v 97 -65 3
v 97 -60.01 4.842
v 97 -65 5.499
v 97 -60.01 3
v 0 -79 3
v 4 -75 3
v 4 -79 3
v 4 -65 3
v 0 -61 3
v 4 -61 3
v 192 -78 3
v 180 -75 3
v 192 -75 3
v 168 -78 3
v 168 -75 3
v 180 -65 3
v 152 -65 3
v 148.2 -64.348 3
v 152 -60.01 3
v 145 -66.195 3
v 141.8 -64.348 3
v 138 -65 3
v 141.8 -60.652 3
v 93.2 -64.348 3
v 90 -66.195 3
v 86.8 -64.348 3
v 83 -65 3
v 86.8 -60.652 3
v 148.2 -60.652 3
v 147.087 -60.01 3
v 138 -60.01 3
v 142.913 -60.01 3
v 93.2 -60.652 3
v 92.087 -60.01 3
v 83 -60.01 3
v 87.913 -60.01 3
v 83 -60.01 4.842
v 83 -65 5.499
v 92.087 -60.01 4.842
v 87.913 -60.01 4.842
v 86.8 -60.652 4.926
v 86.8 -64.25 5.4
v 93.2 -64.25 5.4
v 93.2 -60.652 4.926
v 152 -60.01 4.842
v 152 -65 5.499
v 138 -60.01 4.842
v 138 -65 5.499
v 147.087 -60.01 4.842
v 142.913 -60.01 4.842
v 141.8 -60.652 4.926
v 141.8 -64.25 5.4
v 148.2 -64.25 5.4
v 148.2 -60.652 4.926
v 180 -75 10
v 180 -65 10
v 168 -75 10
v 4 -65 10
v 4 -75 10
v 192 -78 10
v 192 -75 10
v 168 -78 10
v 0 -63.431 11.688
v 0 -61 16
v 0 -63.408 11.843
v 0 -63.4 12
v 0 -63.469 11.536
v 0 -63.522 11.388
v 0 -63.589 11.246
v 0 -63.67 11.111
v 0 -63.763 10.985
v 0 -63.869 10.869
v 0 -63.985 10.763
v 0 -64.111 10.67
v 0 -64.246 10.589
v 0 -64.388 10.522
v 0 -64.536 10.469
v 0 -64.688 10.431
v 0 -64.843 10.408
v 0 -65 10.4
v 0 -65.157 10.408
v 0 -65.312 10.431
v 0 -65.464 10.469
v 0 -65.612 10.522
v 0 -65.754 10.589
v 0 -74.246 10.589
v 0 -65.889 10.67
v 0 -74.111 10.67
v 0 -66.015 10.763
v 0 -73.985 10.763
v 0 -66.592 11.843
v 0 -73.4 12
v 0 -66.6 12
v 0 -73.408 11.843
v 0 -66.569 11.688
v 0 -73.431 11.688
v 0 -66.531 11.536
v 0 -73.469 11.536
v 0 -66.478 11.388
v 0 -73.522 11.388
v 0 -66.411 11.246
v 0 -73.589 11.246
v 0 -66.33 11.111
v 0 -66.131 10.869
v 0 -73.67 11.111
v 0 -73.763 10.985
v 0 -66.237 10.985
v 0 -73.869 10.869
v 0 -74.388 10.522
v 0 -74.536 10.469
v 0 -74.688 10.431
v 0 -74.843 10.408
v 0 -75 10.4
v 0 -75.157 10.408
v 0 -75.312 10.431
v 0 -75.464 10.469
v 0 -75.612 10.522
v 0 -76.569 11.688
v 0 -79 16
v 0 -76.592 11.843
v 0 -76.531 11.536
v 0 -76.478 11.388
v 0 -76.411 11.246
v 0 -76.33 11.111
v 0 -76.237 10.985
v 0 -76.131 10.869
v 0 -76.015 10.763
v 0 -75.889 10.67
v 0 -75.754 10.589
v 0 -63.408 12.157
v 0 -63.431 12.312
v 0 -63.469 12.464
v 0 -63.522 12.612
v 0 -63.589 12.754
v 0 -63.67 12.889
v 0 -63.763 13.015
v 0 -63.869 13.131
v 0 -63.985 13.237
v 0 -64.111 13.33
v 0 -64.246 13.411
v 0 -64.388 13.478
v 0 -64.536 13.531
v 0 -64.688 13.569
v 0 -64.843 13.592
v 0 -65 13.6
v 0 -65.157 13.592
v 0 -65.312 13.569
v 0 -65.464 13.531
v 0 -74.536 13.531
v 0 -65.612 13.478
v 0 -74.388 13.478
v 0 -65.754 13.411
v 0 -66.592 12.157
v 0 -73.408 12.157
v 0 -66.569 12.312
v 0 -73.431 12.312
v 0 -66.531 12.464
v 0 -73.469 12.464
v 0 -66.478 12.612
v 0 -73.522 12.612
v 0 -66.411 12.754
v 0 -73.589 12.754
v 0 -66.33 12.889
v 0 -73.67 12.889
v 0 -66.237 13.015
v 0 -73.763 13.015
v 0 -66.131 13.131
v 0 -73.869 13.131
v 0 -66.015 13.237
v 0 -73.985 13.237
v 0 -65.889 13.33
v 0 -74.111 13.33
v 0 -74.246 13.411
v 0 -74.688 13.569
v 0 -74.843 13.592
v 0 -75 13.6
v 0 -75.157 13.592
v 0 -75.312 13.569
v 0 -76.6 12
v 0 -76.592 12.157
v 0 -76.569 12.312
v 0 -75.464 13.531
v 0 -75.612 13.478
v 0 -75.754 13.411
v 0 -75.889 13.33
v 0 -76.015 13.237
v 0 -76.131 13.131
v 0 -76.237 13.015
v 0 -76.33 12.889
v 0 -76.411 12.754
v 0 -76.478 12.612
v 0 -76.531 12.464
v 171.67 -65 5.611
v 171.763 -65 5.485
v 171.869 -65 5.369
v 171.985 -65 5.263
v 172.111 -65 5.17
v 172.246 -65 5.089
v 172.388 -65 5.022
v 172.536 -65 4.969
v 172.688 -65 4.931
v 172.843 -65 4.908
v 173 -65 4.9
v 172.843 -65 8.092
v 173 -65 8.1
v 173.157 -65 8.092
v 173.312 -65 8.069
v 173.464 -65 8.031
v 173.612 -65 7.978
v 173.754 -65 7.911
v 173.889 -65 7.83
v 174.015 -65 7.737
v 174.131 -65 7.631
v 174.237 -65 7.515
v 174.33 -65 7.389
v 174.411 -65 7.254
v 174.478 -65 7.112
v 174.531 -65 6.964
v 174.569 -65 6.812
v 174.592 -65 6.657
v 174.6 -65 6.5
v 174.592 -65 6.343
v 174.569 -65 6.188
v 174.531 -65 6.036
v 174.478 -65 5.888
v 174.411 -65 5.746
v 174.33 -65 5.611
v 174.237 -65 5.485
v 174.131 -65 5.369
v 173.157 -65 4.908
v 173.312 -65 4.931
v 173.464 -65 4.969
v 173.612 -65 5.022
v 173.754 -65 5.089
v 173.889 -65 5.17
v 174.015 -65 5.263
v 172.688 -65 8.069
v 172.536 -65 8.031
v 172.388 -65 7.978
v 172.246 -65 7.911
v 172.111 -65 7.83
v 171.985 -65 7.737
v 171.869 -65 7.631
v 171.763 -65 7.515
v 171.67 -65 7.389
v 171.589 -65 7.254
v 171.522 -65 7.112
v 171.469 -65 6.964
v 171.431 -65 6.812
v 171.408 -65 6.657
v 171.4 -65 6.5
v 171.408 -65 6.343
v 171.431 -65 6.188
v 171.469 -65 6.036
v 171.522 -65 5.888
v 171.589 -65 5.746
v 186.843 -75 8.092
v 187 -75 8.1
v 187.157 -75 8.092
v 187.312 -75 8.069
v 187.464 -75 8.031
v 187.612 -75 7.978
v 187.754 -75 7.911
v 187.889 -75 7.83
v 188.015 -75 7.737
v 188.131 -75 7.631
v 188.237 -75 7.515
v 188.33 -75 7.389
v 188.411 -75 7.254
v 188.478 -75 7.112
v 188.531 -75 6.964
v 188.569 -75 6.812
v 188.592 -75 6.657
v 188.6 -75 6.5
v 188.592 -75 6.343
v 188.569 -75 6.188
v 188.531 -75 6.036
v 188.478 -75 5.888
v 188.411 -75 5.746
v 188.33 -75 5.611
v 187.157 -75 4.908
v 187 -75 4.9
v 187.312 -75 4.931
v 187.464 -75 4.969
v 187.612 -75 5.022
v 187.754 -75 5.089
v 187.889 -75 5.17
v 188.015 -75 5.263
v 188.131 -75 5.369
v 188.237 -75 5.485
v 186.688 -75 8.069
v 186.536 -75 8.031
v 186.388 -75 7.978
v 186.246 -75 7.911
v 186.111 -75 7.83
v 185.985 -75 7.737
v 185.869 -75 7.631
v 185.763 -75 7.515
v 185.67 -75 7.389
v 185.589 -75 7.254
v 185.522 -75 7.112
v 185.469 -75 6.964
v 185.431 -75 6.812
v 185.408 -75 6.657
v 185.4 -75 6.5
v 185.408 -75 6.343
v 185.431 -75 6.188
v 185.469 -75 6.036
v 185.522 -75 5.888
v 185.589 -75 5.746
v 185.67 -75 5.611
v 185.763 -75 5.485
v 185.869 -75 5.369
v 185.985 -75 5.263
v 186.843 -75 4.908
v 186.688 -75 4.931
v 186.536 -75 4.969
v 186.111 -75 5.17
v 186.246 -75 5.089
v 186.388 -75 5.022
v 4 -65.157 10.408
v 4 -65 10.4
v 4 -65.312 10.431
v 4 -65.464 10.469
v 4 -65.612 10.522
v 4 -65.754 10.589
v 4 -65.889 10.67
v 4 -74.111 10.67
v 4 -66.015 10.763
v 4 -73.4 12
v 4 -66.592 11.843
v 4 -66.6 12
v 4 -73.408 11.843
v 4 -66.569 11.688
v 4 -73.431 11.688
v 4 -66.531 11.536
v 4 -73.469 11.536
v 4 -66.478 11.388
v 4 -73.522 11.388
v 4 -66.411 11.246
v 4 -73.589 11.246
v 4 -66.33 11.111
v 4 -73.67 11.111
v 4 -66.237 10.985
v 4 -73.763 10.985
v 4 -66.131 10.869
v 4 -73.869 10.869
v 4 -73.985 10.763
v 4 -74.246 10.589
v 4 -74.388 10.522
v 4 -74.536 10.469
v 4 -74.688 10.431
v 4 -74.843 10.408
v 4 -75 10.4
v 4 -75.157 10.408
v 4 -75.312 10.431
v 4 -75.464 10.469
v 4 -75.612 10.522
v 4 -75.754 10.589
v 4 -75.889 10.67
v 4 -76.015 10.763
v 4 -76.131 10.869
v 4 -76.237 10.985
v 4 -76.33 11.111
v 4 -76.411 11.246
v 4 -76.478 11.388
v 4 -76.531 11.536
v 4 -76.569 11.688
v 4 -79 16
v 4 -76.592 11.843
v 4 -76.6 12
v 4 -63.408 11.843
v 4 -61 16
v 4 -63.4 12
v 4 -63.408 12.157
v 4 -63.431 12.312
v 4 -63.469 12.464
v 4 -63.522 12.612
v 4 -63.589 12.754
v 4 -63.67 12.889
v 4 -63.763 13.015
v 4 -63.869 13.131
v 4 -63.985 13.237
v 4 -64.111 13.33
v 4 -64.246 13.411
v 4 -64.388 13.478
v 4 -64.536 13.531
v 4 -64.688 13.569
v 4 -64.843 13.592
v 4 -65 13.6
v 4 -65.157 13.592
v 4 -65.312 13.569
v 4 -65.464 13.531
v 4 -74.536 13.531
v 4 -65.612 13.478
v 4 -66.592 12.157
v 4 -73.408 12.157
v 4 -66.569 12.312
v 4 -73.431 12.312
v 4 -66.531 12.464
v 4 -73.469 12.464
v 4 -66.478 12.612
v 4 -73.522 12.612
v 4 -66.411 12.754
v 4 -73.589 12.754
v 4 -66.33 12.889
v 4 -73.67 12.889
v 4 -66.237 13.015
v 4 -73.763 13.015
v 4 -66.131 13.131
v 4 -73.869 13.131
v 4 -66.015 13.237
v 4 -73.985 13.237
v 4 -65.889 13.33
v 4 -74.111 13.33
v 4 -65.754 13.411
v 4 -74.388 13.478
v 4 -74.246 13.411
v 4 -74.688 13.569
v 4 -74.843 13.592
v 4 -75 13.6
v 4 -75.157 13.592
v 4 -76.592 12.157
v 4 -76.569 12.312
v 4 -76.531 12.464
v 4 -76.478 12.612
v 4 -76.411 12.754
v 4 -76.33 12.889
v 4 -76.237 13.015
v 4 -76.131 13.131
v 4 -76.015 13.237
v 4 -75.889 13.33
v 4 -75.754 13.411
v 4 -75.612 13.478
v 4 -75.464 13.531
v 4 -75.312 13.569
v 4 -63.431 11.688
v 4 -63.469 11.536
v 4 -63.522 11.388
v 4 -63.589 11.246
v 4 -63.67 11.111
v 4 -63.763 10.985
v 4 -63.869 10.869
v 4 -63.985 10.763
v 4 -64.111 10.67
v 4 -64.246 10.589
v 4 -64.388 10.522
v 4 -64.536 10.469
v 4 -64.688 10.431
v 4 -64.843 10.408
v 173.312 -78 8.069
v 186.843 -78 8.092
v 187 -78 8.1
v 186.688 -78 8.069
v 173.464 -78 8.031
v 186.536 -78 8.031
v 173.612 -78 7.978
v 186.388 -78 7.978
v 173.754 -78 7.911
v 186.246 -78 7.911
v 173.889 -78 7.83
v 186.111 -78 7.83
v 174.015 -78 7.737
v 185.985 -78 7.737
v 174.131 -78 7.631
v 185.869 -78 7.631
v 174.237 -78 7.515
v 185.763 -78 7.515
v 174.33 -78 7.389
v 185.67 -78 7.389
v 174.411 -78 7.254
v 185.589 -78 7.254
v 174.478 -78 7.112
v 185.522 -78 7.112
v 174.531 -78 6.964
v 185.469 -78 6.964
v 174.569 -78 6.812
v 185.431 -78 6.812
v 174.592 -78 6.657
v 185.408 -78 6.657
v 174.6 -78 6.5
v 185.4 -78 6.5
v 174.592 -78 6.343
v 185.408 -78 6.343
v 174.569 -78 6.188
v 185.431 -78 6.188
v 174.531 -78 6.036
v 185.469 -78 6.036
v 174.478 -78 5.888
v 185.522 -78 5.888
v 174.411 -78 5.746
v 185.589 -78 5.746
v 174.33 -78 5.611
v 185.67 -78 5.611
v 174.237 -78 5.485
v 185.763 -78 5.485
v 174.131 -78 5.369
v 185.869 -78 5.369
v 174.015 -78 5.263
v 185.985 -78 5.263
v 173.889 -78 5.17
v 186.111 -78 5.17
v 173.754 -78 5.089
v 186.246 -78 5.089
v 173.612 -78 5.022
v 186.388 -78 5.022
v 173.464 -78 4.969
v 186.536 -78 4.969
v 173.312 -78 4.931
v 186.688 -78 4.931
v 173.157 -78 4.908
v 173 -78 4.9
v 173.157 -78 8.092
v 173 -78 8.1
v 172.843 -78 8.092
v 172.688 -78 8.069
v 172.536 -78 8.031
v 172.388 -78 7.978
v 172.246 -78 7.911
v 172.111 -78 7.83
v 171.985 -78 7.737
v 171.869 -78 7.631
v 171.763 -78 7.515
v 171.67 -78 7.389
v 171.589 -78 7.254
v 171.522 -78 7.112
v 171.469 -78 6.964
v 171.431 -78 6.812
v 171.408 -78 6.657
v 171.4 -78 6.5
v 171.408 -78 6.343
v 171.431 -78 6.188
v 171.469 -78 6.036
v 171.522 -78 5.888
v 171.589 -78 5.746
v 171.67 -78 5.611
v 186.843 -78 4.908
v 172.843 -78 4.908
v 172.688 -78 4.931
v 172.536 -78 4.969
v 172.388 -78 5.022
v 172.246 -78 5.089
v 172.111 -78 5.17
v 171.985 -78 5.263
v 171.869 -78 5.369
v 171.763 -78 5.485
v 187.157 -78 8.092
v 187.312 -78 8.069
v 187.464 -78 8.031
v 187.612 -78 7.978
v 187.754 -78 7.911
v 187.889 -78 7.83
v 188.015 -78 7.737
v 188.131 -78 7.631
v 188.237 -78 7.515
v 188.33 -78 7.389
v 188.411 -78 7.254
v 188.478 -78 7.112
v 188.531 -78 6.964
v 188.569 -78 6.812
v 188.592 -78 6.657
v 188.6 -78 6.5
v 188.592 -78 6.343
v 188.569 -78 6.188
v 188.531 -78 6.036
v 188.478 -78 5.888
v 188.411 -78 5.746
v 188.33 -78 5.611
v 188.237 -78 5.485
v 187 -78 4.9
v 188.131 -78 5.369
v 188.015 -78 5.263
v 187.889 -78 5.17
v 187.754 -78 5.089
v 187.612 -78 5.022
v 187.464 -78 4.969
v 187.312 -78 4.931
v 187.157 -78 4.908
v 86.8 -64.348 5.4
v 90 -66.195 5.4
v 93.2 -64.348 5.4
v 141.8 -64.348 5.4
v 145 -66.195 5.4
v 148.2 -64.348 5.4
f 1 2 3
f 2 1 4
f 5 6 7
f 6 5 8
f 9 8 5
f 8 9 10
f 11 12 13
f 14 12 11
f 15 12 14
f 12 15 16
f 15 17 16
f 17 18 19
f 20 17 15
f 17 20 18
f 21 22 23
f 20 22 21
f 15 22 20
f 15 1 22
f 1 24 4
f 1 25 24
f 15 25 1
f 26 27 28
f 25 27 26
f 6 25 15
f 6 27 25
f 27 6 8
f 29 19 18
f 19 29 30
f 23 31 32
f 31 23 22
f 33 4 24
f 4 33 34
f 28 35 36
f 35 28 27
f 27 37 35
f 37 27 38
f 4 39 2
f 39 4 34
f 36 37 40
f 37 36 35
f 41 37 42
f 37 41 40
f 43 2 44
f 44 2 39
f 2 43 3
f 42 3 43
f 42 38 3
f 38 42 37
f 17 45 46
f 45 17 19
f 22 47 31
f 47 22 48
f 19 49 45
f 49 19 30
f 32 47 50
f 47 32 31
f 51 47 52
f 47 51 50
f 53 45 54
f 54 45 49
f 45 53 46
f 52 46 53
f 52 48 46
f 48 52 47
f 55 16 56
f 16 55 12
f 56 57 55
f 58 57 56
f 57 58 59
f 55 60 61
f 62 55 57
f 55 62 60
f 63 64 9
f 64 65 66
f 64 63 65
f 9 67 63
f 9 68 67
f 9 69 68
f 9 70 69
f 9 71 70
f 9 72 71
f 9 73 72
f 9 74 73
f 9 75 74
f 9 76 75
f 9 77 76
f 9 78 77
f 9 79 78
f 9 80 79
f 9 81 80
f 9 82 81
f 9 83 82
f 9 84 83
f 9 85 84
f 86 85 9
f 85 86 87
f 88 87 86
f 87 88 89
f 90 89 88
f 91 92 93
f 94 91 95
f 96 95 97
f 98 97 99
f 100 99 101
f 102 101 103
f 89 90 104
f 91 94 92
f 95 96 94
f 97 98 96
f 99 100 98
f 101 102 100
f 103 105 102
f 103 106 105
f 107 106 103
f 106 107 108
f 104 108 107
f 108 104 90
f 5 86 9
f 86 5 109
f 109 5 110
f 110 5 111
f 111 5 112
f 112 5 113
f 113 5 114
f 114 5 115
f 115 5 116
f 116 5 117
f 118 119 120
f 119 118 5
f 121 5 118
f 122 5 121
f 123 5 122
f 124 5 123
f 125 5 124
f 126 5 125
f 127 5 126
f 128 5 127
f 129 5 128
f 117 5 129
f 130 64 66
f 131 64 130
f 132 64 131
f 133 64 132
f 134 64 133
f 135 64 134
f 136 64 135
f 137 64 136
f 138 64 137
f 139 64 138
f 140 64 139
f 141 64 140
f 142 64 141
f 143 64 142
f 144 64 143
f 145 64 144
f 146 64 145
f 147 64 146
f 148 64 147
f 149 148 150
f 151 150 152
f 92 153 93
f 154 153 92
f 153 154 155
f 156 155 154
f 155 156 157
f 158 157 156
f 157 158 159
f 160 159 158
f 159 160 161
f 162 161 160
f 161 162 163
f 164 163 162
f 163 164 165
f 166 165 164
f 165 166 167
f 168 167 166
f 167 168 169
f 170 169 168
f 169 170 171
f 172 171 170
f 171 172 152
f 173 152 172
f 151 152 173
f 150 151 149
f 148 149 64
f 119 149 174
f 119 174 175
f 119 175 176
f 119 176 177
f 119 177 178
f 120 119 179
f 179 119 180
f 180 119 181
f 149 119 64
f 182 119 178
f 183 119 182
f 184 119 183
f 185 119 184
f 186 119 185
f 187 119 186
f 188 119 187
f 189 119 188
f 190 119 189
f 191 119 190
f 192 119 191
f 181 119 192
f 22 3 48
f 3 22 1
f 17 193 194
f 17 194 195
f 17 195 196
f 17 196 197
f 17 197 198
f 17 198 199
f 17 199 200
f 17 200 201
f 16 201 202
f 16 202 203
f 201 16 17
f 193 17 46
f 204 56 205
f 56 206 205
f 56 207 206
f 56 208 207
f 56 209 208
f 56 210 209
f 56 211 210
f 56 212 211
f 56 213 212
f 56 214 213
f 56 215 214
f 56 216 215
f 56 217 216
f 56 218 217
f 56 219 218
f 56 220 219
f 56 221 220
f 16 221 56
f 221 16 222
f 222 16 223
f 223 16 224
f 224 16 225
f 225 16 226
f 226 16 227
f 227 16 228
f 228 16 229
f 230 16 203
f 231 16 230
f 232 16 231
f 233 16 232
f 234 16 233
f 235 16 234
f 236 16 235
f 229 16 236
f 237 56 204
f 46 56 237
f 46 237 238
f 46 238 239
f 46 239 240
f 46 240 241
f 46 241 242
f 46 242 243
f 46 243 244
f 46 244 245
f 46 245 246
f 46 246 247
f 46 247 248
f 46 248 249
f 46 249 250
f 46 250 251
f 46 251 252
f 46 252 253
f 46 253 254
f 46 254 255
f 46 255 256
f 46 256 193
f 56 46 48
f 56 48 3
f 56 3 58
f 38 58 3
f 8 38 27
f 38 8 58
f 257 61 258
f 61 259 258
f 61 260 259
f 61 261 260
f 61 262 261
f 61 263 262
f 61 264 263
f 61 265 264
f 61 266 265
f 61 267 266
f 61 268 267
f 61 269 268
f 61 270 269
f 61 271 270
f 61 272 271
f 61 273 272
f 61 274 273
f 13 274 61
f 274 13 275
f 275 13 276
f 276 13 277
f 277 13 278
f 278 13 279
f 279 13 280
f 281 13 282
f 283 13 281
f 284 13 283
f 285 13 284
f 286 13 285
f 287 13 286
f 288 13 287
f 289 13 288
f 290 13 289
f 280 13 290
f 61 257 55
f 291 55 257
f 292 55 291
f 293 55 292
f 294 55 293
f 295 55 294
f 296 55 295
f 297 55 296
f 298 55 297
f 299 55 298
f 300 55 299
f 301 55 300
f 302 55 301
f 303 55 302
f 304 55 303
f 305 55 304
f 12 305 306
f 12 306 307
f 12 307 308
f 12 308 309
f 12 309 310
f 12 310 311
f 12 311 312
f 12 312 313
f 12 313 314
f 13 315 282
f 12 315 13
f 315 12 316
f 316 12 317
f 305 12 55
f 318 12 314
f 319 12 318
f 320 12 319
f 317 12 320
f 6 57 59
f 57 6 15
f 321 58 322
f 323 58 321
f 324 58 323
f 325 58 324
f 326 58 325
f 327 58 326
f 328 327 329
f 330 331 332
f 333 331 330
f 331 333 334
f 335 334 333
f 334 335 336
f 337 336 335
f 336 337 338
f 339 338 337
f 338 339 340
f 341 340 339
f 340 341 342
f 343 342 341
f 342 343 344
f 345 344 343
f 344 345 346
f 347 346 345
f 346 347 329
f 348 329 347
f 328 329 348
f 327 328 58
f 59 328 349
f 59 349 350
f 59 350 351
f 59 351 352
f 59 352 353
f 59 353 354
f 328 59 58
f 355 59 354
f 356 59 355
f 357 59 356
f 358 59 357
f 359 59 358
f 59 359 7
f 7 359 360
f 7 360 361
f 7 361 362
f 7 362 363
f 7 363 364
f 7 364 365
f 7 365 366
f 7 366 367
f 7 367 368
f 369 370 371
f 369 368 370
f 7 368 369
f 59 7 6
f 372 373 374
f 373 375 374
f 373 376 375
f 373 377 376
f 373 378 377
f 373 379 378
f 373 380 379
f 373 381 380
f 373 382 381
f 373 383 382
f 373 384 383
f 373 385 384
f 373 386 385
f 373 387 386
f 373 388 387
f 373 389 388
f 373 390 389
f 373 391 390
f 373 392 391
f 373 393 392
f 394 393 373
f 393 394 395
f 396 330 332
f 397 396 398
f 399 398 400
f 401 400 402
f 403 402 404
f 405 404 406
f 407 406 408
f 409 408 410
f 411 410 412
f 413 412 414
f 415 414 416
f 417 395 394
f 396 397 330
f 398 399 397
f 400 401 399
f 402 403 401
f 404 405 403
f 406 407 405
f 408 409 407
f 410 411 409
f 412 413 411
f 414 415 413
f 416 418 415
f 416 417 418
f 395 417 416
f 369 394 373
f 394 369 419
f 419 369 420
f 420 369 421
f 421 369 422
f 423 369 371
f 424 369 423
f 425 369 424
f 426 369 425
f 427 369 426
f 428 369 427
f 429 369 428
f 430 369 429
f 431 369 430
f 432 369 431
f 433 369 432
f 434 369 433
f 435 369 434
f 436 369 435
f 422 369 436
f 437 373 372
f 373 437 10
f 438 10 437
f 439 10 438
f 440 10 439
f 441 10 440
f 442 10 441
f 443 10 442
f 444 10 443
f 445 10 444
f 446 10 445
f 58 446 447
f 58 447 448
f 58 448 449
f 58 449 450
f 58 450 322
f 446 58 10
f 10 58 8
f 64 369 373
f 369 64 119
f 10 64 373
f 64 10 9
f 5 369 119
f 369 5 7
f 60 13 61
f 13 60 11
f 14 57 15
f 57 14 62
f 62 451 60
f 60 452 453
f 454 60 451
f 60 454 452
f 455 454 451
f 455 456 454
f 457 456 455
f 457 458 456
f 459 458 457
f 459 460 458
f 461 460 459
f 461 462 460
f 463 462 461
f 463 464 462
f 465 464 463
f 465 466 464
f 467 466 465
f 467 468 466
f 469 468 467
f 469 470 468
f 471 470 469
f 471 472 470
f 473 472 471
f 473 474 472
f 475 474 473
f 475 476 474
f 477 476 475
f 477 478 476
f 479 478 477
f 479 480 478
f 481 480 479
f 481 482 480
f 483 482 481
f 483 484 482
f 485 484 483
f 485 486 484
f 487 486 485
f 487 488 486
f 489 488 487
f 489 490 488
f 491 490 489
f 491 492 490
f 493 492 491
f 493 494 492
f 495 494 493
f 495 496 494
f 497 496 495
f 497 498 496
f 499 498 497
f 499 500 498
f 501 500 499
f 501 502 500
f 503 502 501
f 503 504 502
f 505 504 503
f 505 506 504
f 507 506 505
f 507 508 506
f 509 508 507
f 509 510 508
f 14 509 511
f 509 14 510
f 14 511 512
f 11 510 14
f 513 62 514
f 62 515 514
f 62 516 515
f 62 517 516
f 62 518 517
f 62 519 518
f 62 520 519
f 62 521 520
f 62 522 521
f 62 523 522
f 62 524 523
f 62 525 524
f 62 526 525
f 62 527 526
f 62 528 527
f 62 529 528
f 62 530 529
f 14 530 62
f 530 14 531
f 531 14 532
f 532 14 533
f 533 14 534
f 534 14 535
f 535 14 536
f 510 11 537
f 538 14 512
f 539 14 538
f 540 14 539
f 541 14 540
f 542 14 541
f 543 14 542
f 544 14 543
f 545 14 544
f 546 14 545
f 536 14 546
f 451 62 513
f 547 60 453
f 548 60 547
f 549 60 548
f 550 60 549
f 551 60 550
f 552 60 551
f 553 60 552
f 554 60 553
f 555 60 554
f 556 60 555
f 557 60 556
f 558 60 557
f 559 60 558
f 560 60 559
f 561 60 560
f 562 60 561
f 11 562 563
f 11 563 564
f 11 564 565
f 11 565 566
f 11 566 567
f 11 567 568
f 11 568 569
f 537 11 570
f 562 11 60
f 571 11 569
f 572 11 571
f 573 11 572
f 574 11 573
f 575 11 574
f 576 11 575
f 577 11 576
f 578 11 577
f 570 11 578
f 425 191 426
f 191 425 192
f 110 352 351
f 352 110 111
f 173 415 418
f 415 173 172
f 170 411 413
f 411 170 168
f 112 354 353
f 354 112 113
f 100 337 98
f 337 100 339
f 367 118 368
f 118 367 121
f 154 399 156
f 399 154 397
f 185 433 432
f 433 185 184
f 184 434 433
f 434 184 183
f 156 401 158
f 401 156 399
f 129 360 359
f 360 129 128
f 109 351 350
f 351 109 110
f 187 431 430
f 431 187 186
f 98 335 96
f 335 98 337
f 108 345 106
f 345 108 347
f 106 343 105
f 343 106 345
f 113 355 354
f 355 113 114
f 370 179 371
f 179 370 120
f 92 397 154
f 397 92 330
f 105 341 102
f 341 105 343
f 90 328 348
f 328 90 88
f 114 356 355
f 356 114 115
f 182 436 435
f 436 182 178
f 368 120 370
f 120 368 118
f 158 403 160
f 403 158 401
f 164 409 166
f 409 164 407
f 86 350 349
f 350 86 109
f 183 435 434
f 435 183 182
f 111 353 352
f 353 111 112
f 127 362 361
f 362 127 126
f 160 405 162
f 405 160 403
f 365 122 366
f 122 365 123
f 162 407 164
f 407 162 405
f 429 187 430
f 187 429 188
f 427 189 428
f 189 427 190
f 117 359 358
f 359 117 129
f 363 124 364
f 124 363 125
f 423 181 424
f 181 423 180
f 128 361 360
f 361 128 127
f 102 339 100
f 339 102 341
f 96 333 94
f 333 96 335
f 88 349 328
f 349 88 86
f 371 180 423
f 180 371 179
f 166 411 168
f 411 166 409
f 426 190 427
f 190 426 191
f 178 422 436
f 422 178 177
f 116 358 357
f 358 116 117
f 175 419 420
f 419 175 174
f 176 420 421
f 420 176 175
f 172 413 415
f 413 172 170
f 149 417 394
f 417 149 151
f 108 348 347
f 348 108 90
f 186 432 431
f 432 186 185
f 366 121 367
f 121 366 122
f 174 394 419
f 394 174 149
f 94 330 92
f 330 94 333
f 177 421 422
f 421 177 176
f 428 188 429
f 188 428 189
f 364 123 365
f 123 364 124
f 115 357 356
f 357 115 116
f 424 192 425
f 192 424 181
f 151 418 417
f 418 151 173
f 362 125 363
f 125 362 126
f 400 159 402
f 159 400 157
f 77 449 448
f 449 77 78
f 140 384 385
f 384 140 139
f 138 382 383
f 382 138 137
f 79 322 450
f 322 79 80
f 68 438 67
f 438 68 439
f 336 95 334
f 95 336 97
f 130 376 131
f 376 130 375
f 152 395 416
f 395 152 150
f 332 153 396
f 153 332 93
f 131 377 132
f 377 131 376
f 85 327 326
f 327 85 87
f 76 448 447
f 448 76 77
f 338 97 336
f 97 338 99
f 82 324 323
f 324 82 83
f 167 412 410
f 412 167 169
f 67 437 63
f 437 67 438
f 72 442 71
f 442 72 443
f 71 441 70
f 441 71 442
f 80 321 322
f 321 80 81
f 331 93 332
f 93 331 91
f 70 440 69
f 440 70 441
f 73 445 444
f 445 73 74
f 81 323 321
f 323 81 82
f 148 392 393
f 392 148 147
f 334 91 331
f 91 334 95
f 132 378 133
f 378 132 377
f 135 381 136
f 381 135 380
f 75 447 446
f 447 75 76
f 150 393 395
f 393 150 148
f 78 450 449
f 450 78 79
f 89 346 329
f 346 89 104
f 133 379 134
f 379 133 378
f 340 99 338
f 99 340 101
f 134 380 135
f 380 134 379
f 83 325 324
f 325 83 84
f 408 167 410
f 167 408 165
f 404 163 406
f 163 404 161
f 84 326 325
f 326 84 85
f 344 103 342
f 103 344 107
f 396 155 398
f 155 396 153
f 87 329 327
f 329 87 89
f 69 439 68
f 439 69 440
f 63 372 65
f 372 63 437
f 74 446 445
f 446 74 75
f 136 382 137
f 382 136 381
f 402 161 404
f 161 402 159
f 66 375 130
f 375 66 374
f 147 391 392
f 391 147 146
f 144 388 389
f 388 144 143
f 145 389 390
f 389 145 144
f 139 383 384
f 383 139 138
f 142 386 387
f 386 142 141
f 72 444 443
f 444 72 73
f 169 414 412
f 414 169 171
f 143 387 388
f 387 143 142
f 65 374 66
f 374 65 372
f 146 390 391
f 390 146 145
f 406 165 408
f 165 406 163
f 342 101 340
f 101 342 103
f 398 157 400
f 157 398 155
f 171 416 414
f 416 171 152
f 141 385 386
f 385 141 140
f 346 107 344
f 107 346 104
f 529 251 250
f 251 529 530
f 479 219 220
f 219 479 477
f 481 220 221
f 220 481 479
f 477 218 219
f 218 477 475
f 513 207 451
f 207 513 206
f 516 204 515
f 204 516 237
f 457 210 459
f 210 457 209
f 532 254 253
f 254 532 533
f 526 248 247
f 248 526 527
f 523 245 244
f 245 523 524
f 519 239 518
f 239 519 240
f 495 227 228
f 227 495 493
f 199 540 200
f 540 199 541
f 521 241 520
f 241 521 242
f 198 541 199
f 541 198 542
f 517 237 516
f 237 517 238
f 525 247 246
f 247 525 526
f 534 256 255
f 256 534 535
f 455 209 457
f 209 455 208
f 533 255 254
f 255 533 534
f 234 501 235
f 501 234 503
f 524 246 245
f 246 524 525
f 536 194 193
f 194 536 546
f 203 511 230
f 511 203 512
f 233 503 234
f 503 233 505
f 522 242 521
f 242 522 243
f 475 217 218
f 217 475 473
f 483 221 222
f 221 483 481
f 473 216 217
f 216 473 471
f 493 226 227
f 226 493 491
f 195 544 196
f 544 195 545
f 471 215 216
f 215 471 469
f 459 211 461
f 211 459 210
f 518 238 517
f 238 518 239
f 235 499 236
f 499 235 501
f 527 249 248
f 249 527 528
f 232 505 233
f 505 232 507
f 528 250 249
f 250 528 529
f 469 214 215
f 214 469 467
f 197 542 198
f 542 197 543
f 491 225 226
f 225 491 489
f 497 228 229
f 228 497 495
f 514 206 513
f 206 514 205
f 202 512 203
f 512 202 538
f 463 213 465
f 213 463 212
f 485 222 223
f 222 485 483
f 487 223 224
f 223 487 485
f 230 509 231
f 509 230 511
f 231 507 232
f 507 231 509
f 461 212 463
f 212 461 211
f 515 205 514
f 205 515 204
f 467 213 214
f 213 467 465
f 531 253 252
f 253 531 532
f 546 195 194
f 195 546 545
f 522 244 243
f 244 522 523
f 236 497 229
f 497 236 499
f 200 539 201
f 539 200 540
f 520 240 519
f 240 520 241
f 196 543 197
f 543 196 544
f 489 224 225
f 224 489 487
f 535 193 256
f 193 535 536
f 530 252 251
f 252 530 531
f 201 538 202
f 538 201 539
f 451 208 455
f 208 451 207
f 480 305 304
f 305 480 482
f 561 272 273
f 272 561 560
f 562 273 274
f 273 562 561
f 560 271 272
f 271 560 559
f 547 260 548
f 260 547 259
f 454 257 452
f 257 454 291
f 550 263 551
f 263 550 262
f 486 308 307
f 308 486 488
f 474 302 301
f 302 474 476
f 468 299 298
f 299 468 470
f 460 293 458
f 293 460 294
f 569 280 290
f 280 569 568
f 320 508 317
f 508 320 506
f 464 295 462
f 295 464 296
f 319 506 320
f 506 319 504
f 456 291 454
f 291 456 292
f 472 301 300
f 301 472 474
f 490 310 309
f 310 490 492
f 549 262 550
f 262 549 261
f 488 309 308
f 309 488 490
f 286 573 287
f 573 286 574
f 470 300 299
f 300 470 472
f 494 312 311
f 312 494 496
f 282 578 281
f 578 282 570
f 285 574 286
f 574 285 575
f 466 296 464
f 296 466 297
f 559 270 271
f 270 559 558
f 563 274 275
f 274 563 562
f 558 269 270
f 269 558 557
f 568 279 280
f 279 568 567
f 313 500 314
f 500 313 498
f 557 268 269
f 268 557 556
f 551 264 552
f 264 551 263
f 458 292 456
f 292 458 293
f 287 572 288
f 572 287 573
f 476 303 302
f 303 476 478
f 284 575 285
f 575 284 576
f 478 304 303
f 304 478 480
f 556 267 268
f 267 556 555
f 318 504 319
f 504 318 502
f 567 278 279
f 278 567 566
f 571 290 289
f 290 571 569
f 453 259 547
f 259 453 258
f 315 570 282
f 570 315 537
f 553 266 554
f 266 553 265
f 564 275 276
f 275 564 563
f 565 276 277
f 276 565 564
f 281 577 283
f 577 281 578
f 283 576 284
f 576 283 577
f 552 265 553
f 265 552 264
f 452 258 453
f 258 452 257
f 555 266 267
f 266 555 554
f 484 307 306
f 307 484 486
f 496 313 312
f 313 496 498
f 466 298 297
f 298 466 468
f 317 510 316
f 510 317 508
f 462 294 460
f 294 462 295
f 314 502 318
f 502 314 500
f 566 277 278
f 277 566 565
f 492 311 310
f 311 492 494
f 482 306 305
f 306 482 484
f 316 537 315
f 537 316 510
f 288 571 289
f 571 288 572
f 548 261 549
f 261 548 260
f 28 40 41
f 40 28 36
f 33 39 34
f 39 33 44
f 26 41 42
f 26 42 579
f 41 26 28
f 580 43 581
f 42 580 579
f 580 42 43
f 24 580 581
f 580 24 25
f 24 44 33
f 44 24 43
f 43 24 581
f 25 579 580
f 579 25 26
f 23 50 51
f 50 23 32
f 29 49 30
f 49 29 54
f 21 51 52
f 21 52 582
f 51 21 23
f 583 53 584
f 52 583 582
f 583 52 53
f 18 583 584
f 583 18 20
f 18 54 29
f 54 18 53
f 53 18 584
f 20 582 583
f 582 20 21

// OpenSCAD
// file: ../fj.scad
// FreeJet FJ-2 - shared dimensions and helpers.
// Coordinates (mm): X = carriage travel (left -> right, 0 = inner face of the left plate)
//                   Y = paper travel (paper moves toward +Y, 0 = black nozzle line)
//                   Z = up (0 = paper surface on the platen)
// Every part file includes this, so changing a number here moves everything.

$fn = 64;
e = 0.01;
tol = 0.25;          // clearance for printed fits

// ---- which cartridges? (HP 63 / 302 / 123 / 803 family) ---------------------------
// "K" = black only, "CMY" = tri-colour only, "KCMY" = black + tri-colour side by side.
CARTS     = "K";
N_SLOTS   = CARTS == "KCMY" ? 2 : 1;
head_pitch = 28;                      // black-to-colour cartridge spacing in the carriage
head_span = (N_SLOTS - 1) * head_pitch;
function slot_ink(i) = CARTS == "CMY" ? "C" : (i == 0 ? "K" : "C");

// ---- frame ----------------------------------------------------------------
inner_w   = 360 + 2 * head_span;     // distance between the side plates
plate_t   = 8;
rod_d     = 8;
// rods reach through both plates plus a printed collar each side; rounded up to a length
// you can buy (400 mm for one cartridge, 500 mm for black + colour, or cut them)
rod_len   = ceil((inner_w + 2 * 8 + 2 * 8 + 8) / 100) * 100;
plate_y0  = -128;    // side plate outline in Y (includes the roll-holder ear)
plate_y1  = 84;
plate_z0  = -70;     // bottom of the feet
plate_z1  = 70;

// ---- carriage rods ------------------------------------------------------------
rail_y    = -42;
rail_lo_z = 14;
rail_hi_z = 50;
belt_y    = -60;     // axis line of the X motor pulley and idler (both vertical)
belt_z    = 32;      // height of the belt centre
belt_r    = 20*2/PI/2;          // 20T GT2 pitch radius
belt_front_y = belt_y + belt_r; // strand clamped to the carriage
belt_back_y  = belt_y - belt_r; // return strand, passes behind the carriage

// ---- paper path: ONE feed roller just behind the printhead ----------------------------
tire_od   = 22;      // feed roller outside diameter (TPU tires on printed hubs)
feed_y    = -25;     // feed roller axis: as close behind the nozzles as the carriage allows
shaft_z   = -tire_od/2;
// spring-steel leaves press the paper onto the roller (no pinch shaft). They hang from a light
// printed bar spanning the frame above the paper entry; the paper slides in under the bar.
leaf_bar_y = -70;    // bar centre line
leaf_bar_z = 3;      // underside of the bar (paper passes below)
leaf_y1   = -21;     // leaf tip, just past the top of the roller
leaf_w    = 10;      // 0.3 mm spring steel (feeler-gauge strip), cut 52 mm long
leaf_angle = 7.5;    // ledge tilt: the free leaf would end ~2 mm below the paper -> ~0.4 N
tray_y1   = -74;     // front edge of the paper tray
// platen = a printed beam of bolted segments that also braces the frame
web_y     = [-50, -8, 22, 74];   // stiffening webs under the platen (run along X)
web_t     = 4;
web_z0    = -18;                  // bottom of the webs
flange_y  = [-50, 74];            // the two outer webs bolt to the side plates
flange_z  = [-9, -16];            // M3 bolt heights in the plates (vertical slots in the flanges)
platen_y0 = -62;     // platen top surface extent (entry ramp -> tear-off edge)
platen_y1 = 84;
sensor_y  = -42;     // paper lever switch, just before the roller nip
paper_x0  = 70 + head_span;   // paper left edge (fixed guide)
paper_w   = 220;     // widest sheet
sensor_x  = paper_x0 + 14;   // paper lever switch X
tire_x    = [paper_x0+20, paper_x0+75, paper_x0+145, paper_x0+200];  // roller positions

// ---- feed drive: 20T on the motor -> 60T printed pulley on the roller, 200 mm GT2 loop ----
pulley_teeth = 60;
feed_ctr  = 58.6;                     // centre distance for a 200 mm loop with 20T/60T
feed_dir  = [-0.79, -0.62];           // motor sits below and behind the roller
feed_motor_y = feed_y + feed_ctr * feed_dir[0];
feed_motor_z = shaft_z + feed_ctr * feed_dir[1];

// ---- roll holder: keyhole slots in the side plates -------------------------------------
roll_y    = -116;    // spindle axis
roll_z    = 62;
spindle_d = 12;

// ---- cartridges (MEASURE YOURS AND ADJUST) ------------------------------------------------
cart_w    = 21;      // across the carriage travel (X)
cart_d    = 37;      // front-to-back (Y)
cart_h    = 47;
nz_back   = 12;      // nozzle line distance from the contact (back) face
head_gap  = 1.2;     // nozzle plate height above the paper
flex_w    = 22;  flex_h = 26;   // area for the contact flex (salvaged from an HP DeskJet carriage)
carr_w    = 54 + head_span;     // carriage width along X
park_x    = 33;      // black (slot 0) nozzles X when parked (capped); carriage left face at 6
function slot_x(i) = (i - (N_SLOTS - 1) / 2) * head_pitch;   // slot i vs carriage centre

// ---- service station ------------------------------------------------------------
home_x    = 30;      // slot-0 nozzle X where the home switch trips (firmware X = 0)
sled_engage = 9;     // sled travel when parked (cap pressed on the nozzles)
cap_x     = park_x + sled_engage;   // slot-0 cap centre with the sled retracted (caps at head_pitch)
wiper_x   = 56 + head_span;
spit_x    = 62 + head_span;      // firmware spit_x_um = (spit_x - home_x) * 1000

// ---- hardware -----------------------------------------------------------------
lm8uu_d = 15; lm8uu_l = 24;
b608_d = 22; b608_w = 7;
m3 = 3.2; m3_head = 6; m3_nut = 6.4;   // across flats + tolerance
m25 = 2.7;
nema_hole = 31; nema_body = 42.3; nema_boss = 22.5;

// ---- derived layout ------------------------------------------------------------------
// segment boundaries: segment 0 carries the service-station end, the rest share the width
platen_seg0_end = paper_x0 + 88 <= 160 ? paper_x0 + 88 : paper_x0 - 10;   // keep joints off the sensor
platen_rest = ceil((inner_w - platen_seg0_end) / 130);
platen_segs = 1 + platen_rest;
function platen_seg_x(s) = s == 0 ? [0, platen_seg0_end] :
    let(w = (inner_w - platen_seg0_end) / platen_rest)
    [platen_seg0_end + (s - 1) * w, s == platen_segs - 1 ? inner_w : platen_seg0_end + s * w];
// electronics tray position (bolts through the platen webs)
etray_x0  = paper_x0 + 80 + (N_SLOTS > 1 ? 15 : 0);   // keep its bolts off the platen joints
etray_bolts = [etray_x0 + 25, etray_x0 + 95];

module rod_hole(l=40, d=rod_d+tol) { cylinder(d=d, h=l, center=true); }
module m3_hole(l=40) { cylinder(d=m3, h=l, center=true); }
module m3_nut_trap(h=3) { cylinder(d=m3_nut/cos(30), h=h, $fn=6); }
module rounded_box(size, r=3) {
    hull() for (x=[r, size[0]-r], y=[r, size[1]-r]) translate([x, y, 0]) cylinder(r=r, h=size[2]);
}
module nema17_holes(l=20, slot=0) {
    for (x=[-1,1], y=[-1,1]) hull() for (s=[-slot/2, slot/2])
        translate([x*nema_hole/2, y*nema_hole/2 + s, 0]) cylinder(d=m3, h=l, center=true);
    hull() for (s=[-slot/2, slot/2]) translate([0, s, 0]) cylinder(d=nema_boss+1, h=l, center=true);
}

// ---- printed shaft collars --------------------------------------------------------
collar_od = 20; collar_w = 8;

// ---- carriage details ------------------------------------------------------------
carr_z0   = head_gap + 2.5;   // carriage walls stop above the nozzle plate
carr_z1   = 60;
cart_rest_z = 14;              // height (above cartridge bottom) of the side rest tabs; 0 = none
// main file
// Leaf-spring bar: spans the frame just above the paper entry and holds four spring-steel
// leaves that press the paper onto the feed roller's tires (Openprinter-style: no pinch shaft).
//   PART="bar" PIECE=0 / 1  - two halves, spliced in the middle with 2x M3x16 + nuts,
//                              ends bolt to the side plates (2x M3 each)
//   PART="clamp"            - print 4: holds a leaf on its ledge with one M3x10 + nut
// Leaves: 0.3 mm spring steel, 10 mm wide, 52 mm long (cut from a feeler-gauge strip).
// Everything stays above Z = 3 so the paper slides in underneath.
include <../fj.scad>
PART = "bar";
PIECE = 0;
bar_h = 7; bar_d = 10;
ledge_y0 = leaf_bar_y + bar_d/2;          // front face of the bar
ledge_l = 5;                               // ledge depth (stays behind the carriage's bearing lug)
half = inner_w / 2;

module ledge(x) {     // tilted seat in front of the bar, top surface drops toward the roller
    translate([x - leaf_w/2 - 2, ledge_y0 - 0.01, leaf_bar_z])
        intersection() {
            cube([leaf_w + 4, ledge_l, 6]);
            translate([0, 0, 2.5]) rotate([-leaf_angle, 0, 0]) translate([-1, -5, -20]) cube([leaf_w + 6, 20, 20]);
        }
}

module bar(xa, xb) {
    difference() {
        union() {
            translate([xa, leaf_bar_y - bar_d/2, leaf_bar_z]) cube([xb - xa, bar_d, bar_h]);
            if (xa == 0) translate([0, leaf_bar_y - 9, leaf_bar_z]) cube([4, 18, bar_h + 6]);
            if (xb == inner_w) translate([inner_w - 4, leaf_bar_y - 9, leaf_bar_z]) cube([4, 18, bar_h + 6]);
            if (xb == half) translate([half - 12, leaf_bar_y - bar_d/2 - 3, leaf_bar_z]) cube([24, 3, bar_h]);
            for (x=tire_x) if (x > xa + 8 && x < xb - 8) ledge(x);
        }
        if (xa == 0) for (y=[-5, 5]) translate([2, leaf_bar_y + y, leaf_bar_z + 9]) rotate([0,90,0]) cylinder(d=m3, h=10, center=true);
        if (xb == inner_w) for (y=[-5, 5]) translate([inner_w - 2, leaf_bar_y + y, leaf_bar_z + 9]) rotate([0,90,0]) cylinder(d=m3, h=10, center=true);
        for (x=[half - 7, half + 7]) translate([x, leaf_bar_y - bar_d/2, leaf_bar_z + bar_h/2]) rotate([90,0,0]) cylinder(d=m3, h=30, center=true);
        // ledge screw + nut trap from below
        for (x=tire_x) if (x > xa + 8 && x < xb - 8) {
            translate([x, ledge_y0 + ledge_l/2, leaf_bar_z - 1]) cylinder(d=m3, h=12);
            translate([x, ledge_y0 + ledge_l/2, leaf_bar_z - 1]) rotate(30) cylinder(d=m3_nut/cos(30), h=3.4, $fn=6);
        }
    }
}

module clamp() {
    difference() {
        cube([leaf_w + 4, ledge_l, 2.5]);
        translate([(leaf_w + 4)/2, ledge_l/2, -1]) cylinder(d=m3, h=5);
    }
}

module leaf_bar_piece(i) { if (i == 0) bar(0, half); else bar(half, inner_w); }
if (PART == "bar") leaf_bar_piece(PIECE); else clamp();
